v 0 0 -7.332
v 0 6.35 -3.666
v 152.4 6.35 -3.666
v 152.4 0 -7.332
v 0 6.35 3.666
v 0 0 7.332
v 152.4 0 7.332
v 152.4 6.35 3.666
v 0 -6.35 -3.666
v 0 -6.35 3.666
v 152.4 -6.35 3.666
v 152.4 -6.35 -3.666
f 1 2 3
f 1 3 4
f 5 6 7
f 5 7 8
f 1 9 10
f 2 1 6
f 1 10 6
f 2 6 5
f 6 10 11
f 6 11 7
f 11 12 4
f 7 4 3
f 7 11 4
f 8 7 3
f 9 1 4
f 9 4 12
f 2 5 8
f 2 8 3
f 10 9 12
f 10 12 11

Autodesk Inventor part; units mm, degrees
ref_plane "YZ Plane" through (0, 0, 0) normal (1, 0, 0) x (0, 1, 0)
ref_plane "XZ Plane" through (0, 0, 0) normal (0, 1, 0) x (-1, 0, 0)
ref_plane "XY Plane" through (0, 0, 0) normal (0, 0, 1) x (1, 0, 0)
sketch "Sketch1" plane through (0, 0, 0) normal (1, 0, 0) x (0, 1, 0)
  circle A0 centre (0, 0) radius 6.35 construction
  line L0 (0, 0) -> (6.35, -3.6662) construction
  line L1 (0, 0) -> (7.3323, 0) construction
  line L2 (0, 0) -> (6.35, 3.6662) construction
  line L3 (0, 0) -> (7.3323, 0) construction
  line L4 (0, 0) -> (6.35, 3.6662) construction
  line L5 (0, 0) -> (0, 7.3323) construction
  line L6 (0, 0) -> (-6.35, 3.6662) construction
  line L7 (0, 0) -> (-6.35, -3.6662) construction
  line L8 (0, 0) -> (0, -7.3323) construction
  line L9 (0, 7.3323) -> (6.35, 3.6662)
  line L10 (6.35, 3.6662) -> (6.35, -3.6662)
  line L11 (6.35, -3.6662) -> (0, -7.3323)
  line L12 (0, -7.3323) -> (-6.35, -3.6662)
  line L13 (-6.35, -3.6662) -> (-6.35, 3.6662)
  line L14 (-6.35, 3.6662) -> (0, 7.3323)
  dimension "d0" = 12.7
  dimension "d1" = 30
  dimension "d2" = 30
  dimension "d5" = 360
extrude "Extrusion1" add sketch "Sketch1" along normal blind 152.4
properties part number "axle"
